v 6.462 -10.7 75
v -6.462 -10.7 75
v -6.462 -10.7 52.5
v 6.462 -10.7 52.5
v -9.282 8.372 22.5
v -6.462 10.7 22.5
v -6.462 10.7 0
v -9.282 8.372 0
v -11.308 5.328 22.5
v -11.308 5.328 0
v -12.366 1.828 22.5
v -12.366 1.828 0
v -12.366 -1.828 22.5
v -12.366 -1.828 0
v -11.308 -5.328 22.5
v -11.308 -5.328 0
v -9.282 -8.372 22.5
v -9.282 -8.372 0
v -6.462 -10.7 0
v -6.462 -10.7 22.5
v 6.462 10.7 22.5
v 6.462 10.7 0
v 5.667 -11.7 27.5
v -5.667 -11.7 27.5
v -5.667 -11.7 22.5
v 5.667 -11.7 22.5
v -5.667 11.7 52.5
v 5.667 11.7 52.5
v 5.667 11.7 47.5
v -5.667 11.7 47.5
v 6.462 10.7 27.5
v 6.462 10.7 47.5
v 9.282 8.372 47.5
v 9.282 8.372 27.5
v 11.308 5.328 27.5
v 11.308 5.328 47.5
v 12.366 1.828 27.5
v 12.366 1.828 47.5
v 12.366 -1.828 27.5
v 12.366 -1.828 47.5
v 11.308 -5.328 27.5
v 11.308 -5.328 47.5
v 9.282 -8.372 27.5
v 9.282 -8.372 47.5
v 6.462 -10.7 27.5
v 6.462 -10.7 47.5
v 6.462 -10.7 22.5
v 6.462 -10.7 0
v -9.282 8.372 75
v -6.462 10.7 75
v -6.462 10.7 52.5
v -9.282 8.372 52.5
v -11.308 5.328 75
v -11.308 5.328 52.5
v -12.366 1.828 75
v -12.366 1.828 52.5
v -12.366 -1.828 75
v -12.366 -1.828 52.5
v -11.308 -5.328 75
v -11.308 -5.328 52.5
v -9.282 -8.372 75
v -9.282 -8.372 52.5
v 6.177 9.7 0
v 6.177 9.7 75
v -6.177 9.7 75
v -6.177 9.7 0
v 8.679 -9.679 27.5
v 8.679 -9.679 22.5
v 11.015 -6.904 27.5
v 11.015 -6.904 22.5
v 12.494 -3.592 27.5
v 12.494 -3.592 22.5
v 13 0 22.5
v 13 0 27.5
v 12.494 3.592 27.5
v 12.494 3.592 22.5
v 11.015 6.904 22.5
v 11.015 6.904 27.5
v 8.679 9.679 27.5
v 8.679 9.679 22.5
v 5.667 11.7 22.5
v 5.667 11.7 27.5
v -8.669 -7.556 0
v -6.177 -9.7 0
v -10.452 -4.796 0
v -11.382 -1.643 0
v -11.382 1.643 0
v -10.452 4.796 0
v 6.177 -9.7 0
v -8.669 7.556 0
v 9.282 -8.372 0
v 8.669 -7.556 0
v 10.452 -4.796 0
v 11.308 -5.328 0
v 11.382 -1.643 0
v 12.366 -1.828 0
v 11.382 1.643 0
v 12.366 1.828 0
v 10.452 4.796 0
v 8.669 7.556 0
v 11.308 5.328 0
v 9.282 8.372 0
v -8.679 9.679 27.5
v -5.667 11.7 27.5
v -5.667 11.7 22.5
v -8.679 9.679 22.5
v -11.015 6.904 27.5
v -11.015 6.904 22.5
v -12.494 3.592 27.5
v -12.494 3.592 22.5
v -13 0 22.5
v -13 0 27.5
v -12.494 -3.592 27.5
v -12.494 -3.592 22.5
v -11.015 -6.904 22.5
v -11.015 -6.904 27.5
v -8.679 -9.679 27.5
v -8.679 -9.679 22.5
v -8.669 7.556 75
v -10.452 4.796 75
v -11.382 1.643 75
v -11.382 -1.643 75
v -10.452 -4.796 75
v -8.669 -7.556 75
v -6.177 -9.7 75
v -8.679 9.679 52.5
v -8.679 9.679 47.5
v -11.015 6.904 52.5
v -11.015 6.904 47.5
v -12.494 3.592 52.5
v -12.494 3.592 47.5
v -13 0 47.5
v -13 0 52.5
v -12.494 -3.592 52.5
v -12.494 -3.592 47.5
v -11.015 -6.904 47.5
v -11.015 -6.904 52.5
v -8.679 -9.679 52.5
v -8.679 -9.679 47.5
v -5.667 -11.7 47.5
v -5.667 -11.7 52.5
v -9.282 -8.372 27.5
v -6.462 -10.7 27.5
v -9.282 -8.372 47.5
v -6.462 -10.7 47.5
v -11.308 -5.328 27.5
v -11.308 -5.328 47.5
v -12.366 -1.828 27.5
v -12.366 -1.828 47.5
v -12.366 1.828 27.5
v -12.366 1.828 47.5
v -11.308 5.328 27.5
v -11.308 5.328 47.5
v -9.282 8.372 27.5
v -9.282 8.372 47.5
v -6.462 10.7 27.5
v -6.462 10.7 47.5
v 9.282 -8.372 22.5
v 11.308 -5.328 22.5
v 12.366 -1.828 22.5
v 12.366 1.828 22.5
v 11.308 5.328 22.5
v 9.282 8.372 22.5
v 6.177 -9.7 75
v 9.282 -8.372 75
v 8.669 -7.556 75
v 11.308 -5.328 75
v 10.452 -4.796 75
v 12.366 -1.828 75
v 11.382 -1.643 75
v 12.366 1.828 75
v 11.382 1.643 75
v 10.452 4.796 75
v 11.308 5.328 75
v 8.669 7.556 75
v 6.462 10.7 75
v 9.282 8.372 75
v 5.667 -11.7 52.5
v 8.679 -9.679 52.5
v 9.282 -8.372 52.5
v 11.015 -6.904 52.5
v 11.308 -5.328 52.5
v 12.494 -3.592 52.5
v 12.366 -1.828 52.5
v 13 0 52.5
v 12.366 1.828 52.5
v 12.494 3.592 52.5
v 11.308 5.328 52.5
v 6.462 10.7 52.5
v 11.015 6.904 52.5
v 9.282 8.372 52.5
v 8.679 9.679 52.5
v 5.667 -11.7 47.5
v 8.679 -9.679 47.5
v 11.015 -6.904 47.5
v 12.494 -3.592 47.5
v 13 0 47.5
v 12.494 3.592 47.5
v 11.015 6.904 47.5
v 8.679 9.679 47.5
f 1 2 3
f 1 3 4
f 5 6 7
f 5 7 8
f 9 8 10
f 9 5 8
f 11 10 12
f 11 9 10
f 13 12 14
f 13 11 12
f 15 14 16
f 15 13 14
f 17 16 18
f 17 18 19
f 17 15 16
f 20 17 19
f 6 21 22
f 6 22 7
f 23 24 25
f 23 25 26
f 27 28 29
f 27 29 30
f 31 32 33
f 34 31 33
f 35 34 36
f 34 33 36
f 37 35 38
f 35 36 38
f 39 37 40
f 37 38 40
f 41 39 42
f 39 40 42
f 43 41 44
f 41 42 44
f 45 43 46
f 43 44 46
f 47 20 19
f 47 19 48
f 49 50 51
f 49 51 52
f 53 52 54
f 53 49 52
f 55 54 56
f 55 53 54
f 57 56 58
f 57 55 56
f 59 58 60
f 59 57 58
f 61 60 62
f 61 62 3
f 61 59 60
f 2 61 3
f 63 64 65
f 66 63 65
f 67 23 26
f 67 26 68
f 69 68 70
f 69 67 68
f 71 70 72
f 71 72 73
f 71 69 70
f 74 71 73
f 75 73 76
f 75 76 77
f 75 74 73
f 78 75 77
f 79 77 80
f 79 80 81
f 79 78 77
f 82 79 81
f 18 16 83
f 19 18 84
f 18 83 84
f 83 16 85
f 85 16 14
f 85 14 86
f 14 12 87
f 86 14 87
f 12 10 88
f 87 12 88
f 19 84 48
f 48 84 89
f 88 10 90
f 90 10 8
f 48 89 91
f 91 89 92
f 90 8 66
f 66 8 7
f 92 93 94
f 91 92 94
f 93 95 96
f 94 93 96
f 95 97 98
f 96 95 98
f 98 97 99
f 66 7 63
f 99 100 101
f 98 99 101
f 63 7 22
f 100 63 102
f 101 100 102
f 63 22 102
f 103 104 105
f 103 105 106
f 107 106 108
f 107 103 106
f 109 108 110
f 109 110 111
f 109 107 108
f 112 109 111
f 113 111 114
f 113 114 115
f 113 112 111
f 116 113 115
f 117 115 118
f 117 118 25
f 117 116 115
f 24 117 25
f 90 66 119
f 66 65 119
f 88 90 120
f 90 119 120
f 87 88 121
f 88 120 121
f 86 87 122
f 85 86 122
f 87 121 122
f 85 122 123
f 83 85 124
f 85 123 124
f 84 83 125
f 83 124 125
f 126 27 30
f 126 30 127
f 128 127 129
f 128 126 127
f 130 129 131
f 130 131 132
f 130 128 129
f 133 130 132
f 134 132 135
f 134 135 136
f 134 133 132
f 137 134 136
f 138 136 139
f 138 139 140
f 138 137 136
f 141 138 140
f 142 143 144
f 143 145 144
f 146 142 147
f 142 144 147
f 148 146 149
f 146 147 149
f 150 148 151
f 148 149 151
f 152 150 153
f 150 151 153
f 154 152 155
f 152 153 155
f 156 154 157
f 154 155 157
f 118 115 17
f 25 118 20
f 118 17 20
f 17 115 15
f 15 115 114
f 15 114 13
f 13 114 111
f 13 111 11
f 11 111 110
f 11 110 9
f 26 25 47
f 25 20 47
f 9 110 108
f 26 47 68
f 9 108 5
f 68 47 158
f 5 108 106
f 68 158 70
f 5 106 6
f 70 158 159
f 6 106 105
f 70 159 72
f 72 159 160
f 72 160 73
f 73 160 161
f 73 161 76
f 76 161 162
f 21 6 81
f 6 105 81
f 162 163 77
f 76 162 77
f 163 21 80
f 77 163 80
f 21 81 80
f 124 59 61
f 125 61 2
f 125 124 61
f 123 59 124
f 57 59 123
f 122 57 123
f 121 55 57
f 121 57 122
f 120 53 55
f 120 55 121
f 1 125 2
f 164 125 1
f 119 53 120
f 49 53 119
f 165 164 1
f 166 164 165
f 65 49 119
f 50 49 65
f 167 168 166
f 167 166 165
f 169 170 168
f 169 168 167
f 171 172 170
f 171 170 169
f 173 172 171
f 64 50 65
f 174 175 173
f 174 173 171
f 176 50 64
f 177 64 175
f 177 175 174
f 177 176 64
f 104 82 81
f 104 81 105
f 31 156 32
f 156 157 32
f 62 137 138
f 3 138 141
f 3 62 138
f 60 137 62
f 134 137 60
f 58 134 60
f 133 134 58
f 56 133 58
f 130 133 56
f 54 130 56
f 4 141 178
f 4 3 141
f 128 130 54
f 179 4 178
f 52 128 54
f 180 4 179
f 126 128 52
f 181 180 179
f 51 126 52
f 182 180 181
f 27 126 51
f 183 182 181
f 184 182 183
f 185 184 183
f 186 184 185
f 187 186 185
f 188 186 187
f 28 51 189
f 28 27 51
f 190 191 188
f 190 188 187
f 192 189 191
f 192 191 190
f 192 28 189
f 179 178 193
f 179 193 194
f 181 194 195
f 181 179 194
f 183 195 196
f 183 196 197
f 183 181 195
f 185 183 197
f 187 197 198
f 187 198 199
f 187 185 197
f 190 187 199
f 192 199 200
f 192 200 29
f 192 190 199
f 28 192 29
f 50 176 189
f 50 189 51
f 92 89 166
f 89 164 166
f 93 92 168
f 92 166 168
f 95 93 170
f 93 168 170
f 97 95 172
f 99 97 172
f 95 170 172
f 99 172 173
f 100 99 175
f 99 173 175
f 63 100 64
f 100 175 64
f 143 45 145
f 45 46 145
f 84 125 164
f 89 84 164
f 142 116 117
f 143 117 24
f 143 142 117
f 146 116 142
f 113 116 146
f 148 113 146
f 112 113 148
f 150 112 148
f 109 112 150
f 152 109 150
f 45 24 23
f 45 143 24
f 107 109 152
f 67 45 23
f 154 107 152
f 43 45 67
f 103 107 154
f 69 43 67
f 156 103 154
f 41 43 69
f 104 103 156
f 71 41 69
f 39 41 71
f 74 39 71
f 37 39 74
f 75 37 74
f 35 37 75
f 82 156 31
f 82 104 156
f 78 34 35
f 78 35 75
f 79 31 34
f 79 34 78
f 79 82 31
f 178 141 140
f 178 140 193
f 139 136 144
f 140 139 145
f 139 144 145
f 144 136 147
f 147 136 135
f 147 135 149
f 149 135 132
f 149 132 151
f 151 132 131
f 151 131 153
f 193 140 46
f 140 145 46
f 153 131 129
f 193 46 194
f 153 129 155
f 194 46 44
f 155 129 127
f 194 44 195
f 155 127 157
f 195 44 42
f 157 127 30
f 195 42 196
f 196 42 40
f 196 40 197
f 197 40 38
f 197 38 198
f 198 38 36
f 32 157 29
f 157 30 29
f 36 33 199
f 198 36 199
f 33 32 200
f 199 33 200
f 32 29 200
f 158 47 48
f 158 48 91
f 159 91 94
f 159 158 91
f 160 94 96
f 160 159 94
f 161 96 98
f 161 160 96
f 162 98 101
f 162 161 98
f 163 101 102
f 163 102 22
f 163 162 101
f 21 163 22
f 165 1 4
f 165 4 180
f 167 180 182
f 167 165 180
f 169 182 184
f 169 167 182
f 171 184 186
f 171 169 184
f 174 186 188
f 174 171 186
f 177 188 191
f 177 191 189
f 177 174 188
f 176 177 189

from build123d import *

# Parameters (mm, degrees)
F0_R      = 11.5
F0_R_2    = 6.5
F1_DEPTH  = 75
F2_W      = 40
F2_H      = 22.7775762856
F3_DEPTH  = 75
F5_DEPTH  = 75
F7_DEPTH  = 75
F10_DEPTH = 15
F12_DEPTH = 10


# Not quite as in the source:
# - after a boolean that leaves OpenCascade's solid faulty, fix() repairs it


with BuildPart() as f1:
    # F0 (on Top) → F1 (new body)
    with BuildSketch(Plane.XY):
        Circle(F0_R)
        Circle(F0_R_2, mode=Mode.SUBTRACT)
    extrude(amount=F1_DEPTH)

    # F2 (on face) → F3 (cut, through all)
    with BuildSketch(Plane.XY.offset(75)):
        with Locations((0, -21.0887881428)):
            Rectangle(F2_W, F2_H)
        Polygon((-20, 9.7), (20, 9.7), (20, 33.5304923356), (-20, 28.7892241031), align=None)
    extrude(amount=-F3_DEPTH, mode=Mode.SUBTRACT)

    # F4 (on face) → F5 (join)
    with BuildSketch(Plane.XY.offset(75)):
        with BuildLine():
            Line((6.4621977686, 10.7), (-6.4621977686, 10.7))
            ThreePointArc((-6.4621977686, 10.7), (-12.5, 0), (-6.4621977686, -10.7))
            Line((-6.4621977686, -10.7), (6.4621977686, -10.7))
            ThreePointArc((6.4621977686, -10.7), (12.5, 0), (6.4621977686, 10.7))
        make_face()
        with BuildLine():
            ThreePointArc((-6.1773780846, -9.7), (-11.5, 0), (-6.1773780846, 9.7))
            Line((-6.1773780846, 9.7), (6.1773780846, 9.7))
            ThreePointArc((6.1773780846, 9.7), (11.5, 0), (6.1773780846, -9.7))
            Line((6.1773780846, -9.7), (-6.1773780846, -9.7))
        make_face(mode=Mode.SUBTRACT)
    extrude(amount=-F5_DEPTH)

    # F6 (on face) → F7 (cut)
    with BuildSketch(Plane.XY.offset(75)):
        with BuildLine():
            Line((-6.1773780846, -9.7), (6.1773780846, -9.7))
            ThreePointArc((6.1773780846, -9.7), (11.5, 0), (6.1773780846, 9.7))
            Line((6.1773780846, 9.7), (-6.1773780846, 9.7))
            ThreePointArc((-6.1773780846, 9.7), (-11.5, 0), (-6.1773780846, -9.7))
        make_face()
    extrude(amount=-F7_DEPTH, mode=Mode.SUBTRACT)

    # F9 (on mid) → F10 (join, symmetric)
    with BuildSketch(Plane.XY.offset(37.5)):
        with BuildLine():
            Line((5.6665686266, 11.7), (-5.6665686266, 11.7))
            ThreePointArc((-5.6665686266, 11.7), (-13, 0), (-5.6665686266, -11.7))
            Line((-5.6665686266, -11.7), (5.6665686266, -11.7))
            ThreePointArc((5.6665686266, -11.7), (13, 0), (5.6665686266, 11.7))
        make_face()
        with BuildLine():
            ThreePointArc((-6.1773780846, -9.7), (-11.5, 0), (-6.1773780846, 9.7))
            Line((-6.1773780846, 9.7), (6.1773780846, 9.7))
            ThreePointArc((6.1773780846, 9.7), (11.5, 0), (6.1773780846, -9.7))
            Line((6.1773780846, -9.7), (-6.1773780846, -9.7))
        make_face(mode=Mode.SUBTRACT)
    extrude(amount=F10_DEPTH, both=True)

    add(f1.part.fix(), mode=Mode.REPLACE)

    # F11 (on mid) → F12 (cut, symmetric)
    with BuildSketch(Plane.XY.offset(37.5)):
        with BuildLine():
            Line((-5.6665686266, -11.7), (5.6665686266, -11.7))
            ThreePointArc((5.6665686266, -11.7), (13, 0), (5.6665686266, 11.7))
            Line((5.6665686266, 11.7), (-5.6665686266, 11.7))
            ThreePointArc((-5.6665686266, 11.7), (-13, 0), (-5.6665686266, -11.7))
        make_face()
        with BuildLine():
            ThreePointArc((6.4621977686, 10.7), (12.5, 0), (6.4621977686, -10.7))
            Line((6.4621977686, -10.7), (-6.4621977686, -10.7))
            ThreePointArc((-6.4621977686, -10.7), (-12.5, 0), (-6.4621977686, 10.7))
            Line((-6.4621977686, 10.7), (6.4621977686, 10.7))
        make_face(mode=Mode.SUBTRACT)
    extrude(amount=F12_DEPTH, both=True, mode=Mode.SUBTRACT)

    add(f1.part.fix(), mode=Mode.REPLACE)


solid = f1.part
